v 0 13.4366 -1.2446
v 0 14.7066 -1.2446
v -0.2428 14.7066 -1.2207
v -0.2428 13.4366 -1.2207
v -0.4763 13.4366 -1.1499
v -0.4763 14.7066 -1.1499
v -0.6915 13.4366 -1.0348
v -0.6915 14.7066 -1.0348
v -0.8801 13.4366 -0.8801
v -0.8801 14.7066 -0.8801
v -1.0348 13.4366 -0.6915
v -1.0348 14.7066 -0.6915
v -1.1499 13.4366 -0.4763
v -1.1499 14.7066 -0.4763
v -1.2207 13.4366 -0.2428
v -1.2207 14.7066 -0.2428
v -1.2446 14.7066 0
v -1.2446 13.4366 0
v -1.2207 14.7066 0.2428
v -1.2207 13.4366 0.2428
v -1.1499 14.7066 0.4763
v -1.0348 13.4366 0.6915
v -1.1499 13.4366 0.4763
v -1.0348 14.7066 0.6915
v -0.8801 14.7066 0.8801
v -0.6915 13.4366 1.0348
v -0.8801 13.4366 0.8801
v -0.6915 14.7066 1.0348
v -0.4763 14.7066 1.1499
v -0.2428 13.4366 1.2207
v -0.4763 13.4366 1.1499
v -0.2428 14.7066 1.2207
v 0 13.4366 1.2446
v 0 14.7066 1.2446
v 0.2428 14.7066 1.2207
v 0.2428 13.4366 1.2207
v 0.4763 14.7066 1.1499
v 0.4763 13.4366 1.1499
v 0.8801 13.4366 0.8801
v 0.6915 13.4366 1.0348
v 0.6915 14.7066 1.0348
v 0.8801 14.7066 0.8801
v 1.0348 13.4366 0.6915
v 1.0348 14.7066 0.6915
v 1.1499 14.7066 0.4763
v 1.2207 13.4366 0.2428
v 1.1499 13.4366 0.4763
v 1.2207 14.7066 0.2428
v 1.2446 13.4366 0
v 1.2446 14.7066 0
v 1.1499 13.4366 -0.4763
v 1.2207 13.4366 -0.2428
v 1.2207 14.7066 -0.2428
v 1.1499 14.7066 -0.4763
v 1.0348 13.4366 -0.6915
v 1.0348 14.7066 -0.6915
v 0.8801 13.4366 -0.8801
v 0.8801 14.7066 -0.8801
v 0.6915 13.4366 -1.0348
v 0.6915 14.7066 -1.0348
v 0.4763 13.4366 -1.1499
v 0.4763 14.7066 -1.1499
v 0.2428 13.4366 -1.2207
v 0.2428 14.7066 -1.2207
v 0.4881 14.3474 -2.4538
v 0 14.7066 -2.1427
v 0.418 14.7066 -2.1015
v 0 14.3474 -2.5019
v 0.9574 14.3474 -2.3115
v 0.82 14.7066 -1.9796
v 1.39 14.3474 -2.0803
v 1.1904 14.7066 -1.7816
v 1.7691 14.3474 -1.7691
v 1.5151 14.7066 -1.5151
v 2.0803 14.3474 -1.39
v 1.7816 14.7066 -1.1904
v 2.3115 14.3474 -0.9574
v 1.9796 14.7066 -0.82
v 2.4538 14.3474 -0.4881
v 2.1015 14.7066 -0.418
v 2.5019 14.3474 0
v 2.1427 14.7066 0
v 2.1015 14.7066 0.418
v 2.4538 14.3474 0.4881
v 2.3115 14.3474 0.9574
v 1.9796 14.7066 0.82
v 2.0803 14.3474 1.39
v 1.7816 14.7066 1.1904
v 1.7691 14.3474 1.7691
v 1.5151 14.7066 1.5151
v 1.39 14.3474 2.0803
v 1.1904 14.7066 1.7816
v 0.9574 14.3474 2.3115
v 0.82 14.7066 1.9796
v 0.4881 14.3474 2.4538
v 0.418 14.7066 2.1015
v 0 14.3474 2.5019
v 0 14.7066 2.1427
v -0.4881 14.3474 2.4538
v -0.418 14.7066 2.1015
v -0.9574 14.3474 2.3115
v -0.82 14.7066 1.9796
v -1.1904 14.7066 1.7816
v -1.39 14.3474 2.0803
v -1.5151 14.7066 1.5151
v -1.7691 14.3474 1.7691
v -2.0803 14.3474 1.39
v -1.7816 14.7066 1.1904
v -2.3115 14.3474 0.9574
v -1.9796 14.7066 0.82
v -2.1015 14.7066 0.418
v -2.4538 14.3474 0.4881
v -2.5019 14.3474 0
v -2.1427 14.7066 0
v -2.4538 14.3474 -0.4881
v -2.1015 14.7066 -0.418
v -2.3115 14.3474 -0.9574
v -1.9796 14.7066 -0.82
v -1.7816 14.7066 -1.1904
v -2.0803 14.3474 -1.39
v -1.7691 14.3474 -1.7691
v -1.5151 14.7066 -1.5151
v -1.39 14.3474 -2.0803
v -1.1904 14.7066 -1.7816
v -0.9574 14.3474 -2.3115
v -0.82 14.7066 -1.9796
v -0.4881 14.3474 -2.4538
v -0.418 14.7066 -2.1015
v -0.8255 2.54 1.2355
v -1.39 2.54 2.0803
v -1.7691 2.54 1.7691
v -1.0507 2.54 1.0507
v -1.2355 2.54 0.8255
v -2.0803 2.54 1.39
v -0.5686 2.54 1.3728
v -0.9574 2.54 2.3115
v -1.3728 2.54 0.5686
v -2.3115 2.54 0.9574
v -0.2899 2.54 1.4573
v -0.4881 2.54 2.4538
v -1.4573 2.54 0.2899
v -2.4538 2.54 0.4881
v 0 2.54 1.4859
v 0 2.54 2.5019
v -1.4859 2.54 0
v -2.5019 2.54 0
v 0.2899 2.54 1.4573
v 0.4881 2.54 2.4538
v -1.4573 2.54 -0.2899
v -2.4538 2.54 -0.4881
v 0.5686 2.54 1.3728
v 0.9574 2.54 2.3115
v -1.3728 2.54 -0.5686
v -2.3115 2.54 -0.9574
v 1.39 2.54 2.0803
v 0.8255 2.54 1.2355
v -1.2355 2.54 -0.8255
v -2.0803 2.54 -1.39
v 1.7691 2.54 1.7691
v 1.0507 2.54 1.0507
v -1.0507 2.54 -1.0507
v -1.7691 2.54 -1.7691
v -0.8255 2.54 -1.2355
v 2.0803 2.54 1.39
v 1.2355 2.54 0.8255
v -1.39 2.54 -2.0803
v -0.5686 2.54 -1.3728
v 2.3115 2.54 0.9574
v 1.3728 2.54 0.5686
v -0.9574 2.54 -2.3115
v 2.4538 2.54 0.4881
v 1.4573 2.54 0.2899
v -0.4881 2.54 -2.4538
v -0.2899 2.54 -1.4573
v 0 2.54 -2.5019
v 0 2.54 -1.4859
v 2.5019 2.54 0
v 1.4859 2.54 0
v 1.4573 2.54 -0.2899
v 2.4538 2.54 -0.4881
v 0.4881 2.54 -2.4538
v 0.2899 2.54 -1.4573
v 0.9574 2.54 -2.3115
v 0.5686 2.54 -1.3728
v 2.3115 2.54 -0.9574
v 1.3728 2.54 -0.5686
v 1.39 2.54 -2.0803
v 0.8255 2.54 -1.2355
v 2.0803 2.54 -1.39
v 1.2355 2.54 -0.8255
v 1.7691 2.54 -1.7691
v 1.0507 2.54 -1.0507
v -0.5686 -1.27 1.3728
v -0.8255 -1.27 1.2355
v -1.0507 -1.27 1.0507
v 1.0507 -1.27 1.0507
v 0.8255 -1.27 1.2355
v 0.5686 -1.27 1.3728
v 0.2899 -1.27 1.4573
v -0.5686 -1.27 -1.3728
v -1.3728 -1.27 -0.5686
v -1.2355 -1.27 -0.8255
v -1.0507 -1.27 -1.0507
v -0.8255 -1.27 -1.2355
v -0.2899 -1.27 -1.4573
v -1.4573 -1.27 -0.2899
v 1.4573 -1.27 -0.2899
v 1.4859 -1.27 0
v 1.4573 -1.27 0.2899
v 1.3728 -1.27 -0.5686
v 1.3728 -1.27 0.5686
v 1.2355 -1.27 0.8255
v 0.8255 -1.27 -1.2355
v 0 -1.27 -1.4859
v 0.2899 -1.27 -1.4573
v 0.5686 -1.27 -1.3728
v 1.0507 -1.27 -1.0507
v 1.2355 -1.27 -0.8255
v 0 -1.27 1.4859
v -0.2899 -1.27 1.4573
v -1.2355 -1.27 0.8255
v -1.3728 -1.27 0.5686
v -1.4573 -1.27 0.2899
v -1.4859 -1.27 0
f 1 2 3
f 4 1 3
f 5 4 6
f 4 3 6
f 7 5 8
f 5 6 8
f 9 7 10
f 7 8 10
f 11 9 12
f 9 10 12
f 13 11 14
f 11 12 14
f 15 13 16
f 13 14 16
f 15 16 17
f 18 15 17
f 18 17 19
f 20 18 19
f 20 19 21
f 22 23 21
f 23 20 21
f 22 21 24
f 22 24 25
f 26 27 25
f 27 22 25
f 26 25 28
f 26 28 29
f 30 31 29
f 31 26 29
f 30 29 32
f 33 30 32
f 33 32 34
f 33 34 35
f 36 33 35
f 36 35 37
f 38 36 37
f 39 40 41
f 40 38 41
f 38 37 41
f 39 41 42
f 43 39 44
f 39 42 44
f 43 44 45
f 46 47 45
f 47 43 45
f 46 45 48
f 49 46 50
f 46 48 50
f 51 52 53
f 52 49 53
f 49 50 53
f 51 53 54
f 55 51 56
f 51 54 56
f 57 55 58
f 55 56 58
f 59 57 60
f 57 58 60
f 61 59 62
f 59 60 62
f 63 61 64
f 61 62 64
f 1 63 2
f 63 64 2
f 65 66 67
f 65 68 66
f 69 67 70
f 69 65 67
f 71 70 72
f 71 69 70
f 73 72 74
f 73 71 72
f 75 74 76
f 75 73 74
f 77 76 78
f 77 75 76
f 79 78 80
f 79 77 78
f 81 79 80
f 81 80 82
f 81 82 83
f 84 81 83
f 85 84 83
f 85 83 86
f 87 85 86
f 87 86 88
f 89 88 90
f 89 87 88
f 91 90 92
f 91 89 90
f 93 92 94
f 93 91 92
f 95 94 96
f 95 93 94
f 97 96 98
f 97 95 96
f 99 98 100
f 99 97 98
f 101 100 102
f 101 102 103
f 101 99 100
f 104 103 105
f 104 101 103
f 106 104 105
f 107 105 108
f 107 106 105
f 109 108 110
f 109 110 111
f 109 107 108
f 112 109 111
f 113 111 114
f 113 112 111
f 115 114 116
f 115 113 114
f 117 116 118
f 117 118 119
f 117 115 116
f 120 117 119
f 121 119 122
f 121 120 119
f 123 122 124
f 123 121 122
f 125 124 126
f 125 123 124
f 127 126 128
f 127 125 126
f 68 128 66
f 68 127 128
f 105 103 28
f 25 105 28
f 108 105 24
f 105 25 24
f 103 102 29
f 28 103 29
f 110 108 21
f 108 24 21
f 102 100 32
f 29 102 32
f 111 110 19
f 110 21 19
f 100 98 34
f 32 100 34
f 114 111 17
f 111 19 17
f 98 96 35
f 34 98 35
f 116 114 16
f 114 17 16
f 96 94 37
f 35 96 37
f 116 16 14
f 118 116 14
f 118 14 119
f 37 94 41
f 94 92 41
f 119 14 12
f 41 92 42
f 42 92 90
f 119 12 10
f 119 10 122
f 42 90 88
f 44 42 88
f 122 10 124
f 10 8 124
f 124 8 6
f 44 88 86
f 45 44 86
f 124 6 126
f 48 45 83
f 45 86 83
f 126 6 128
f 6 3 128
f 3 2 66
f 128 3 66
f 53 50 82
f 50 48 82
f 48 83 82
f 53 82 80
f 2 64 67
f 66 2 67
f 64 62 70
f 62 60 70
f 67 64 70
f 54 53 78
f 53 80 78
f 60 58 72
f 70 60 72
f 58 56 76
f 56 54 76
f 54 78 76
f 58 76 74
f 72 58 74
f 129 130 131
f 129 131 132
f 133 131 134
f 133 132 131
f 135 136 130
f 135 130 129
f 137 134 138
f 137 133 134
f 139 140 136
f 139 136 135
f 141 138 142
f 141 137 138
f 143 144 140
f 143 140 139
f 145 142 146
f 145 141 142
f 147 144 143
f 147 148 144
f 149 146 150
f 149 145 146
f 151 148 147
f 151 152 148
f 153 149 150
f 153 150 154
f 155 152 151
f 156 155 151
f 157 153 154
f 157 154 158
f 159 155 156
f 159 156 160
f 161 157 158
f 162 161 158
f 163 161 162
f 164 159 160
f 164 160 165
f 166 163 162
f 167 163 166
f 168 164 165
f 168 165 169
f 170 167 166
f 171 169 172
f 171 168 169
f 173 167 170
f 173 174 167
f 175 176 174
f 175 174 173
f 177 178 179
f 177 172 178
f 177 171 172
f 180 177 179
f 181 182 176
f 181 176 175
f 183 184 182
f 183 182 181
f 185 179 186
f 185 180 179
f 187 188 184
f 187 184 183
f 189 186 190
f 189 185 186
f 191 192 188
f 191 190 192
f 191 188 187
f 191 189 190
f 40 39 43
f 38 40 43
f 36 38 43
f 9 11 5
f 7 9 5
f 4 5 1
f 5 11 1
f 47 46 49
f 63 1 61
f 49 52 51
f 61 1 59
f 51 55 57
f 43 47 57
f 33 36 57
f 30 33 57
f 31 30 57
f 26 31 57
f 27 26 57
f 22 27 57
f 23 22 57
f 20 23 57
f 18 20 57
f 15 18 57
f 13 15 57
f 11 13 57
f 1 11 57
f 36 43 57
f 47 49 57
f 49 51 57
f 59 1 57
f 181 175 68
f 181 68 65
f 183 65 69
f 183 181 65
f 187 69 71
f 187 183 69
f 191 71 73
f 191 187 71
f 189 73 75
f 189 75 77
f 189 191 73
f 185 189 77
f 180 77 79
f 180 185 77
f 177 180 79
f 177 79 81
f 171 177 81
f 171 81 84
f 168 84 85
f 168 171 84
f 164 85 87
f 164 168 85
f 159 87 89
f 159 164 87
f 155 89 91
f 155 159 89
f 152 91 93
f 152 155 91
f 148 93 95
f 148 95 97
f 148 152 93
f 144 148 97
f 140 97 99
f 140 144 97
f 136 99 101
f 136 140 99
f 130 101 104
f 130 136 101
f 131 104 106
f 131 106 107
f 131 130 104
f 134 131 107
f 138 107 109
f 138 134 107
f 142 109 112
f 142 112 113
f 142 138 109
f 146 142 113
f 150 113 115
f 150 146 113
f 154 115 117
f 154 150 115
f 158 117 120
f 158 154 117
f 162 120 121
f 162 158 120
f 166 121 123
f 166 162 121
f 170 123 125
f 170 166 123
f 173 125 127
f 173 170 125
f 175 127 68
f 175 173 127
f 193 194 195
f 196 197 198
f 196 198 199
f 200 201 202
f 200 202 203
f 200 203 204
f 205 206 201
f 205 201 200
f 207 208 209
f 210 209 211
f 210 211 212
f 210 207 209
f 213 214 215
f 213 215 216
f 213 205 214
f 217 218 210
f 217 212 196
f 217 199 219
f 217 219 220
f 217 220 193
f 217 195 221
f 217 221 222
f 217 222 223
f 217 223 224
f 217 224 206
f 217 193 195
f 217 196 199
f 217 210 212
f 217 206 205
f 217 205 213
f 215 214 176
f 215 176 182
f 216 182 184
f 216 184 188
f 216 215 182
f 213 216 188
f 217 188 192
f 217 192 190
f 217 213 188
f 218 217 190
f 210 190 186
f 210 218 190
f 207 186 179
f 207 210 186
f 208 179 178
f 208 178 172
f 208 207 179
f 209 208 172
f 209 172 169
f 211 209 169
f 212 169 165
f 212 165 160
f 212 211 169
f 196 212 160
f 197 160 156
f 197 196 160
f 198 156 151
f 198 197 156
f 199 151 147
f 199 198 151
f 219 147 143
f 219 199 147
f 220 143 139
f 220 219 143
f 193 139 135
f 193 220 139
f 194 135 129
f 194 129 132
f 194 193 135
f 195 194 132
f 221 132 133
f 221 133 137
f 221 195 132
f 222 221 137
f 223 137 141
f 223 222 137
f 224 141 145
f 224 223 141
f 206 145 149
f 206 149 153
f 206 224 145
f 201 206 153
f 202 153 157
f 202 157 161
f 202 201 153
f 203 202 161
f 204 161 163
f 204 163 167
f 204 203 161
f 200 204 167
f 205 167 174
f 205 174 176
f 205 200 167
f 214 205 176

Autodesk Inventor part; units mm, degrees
sketch "Sketch_1" plane through (0, 0, 0) normal (1, 0, 0) x (0, 1, 0)
  line L0 (-1.27, 0) -> (13.4366, 0)
  line L1 (13.4366, 0) -> (13.4366, -1.2446)
  line L2 (13.4366, -1.2446) -> (14.7066, -1.2446)
  line L3 (14.7066, -1.2446) -> (14.7066, -2.1427)
  line L4 (14.7066, -2.1427) -> (14.3474, -2.5019)
  line L5 (14.3474, -2.5019) -> (2.54, -2.5019)
  line L6 (2.54, -2.5019) -> (2.54, -1.4859)
  line L7 (2.54, -1.4859) -> (-1.27, -1.4859)
  line L8 (-1.27, -1.4859) -> (-1.27, 0)
  line L9 (-1.27, 0) -> (13.4366, 0)
revolve "Revolution1" add sketch "Sketch_1" angle 360 about axis through (0, -1.27, 0) along (0, -1, 0)
ref_plane "paddle_to_bracket_XY" through (0, -1.3716, 0) normal (0, 0, -1) x (1, 0, 0)
ref_plane "paddle_to_bracket_YZ" through (0, -1.3716, 0) normal (1, 0, 0) x (0, -1, 0)
ref_plane "paddle_to_bracket_ZX" through (0, -1.3716, 0) normal (0, -1, 0) x (0, 0, -1)
ref_plane "paddle_to_led_XY" through (0, 13.8525, 0) normal (0, 1, 0) x (1, 0, 0)
ref_plane "paddle_to_led_YZ" through (0, 13.8525, 0) normal (1, 0, 0) x (0, 0, -1)
ref_plane "paddle_to_led_ZX" through (0, 13.8525, 0) normal (0, 0, -1) x (0, 1, 0)
ref_plane "paddle_to_led_green_XY" through (0, 13.8525, 0) normal (0, 1, 0) x (1, 0, 0)
ref_plane "paddle_to_led_green_YZ" through (0, 13.8525, 0) normal (1, 0, 0) x (0, 0, -1)
ref_plane "paddle_to_led_green_ZX" through (0, 13.8525, 0) normal (0, 0, -1) x (0, 1, 0)
ref_plane "rocker_to_bracket_XY" through (0, 1.778, 0) normal (0, -1, 0) x (1, 0, 0)
ref_plane "rocker_to_bracket_YZ" through (0, 1.778, 0) normal (1, 0, 0) x (0, 0, 1)
ref_plane "rocker_to_bracket_ZX" through (0, 1.778, 0) normal (0, 0, 1) x (0, -1, 0)
ref_plane "toggle_to_bc_XY" through (0, 0, 0) normal (0, 1, 0) x (1, 0, 0)
ref_plane "toggle_to_bc_YZ" through (0, 0, 0) normal (1, 0, 0) x (0, 0, -1)
ref_plane "toggle_to_bc_ZX" through (0, 0, 0) normal (0, 0, -1) x (0, 1, 0)
ref_plane "toggle_to_led_XY" through (0, 13.4366, 0) normal (0, 1, 0) x (1, 0, 0)
ref_plane "toggle_to_led_YZ" through (0, 13.4366, 0) normal (1, 0, 0) x (0, 0, -1)
ref_plane "toggle_to_led_ZX" through (0, 13.4366, 0) normal (0, 0, -1) x (0, 1, 0)
ref_plane "toggle_to_led_green_XY" through (0, 13.4366, 0) normal (0, 1, 0) x (1, 0, 0)
ref_plane "toggle_to_led_green_YZ" through (0, 13.4366, 0) normal (1, 0, 0) x (0, 0, -1)
ref_plane "toggle_to_led_green_ZX" through (0, 13.4366, 0) normal (0, 0, -1) x (0, 1, 0)
properties part number "M211L01W-actuator"
